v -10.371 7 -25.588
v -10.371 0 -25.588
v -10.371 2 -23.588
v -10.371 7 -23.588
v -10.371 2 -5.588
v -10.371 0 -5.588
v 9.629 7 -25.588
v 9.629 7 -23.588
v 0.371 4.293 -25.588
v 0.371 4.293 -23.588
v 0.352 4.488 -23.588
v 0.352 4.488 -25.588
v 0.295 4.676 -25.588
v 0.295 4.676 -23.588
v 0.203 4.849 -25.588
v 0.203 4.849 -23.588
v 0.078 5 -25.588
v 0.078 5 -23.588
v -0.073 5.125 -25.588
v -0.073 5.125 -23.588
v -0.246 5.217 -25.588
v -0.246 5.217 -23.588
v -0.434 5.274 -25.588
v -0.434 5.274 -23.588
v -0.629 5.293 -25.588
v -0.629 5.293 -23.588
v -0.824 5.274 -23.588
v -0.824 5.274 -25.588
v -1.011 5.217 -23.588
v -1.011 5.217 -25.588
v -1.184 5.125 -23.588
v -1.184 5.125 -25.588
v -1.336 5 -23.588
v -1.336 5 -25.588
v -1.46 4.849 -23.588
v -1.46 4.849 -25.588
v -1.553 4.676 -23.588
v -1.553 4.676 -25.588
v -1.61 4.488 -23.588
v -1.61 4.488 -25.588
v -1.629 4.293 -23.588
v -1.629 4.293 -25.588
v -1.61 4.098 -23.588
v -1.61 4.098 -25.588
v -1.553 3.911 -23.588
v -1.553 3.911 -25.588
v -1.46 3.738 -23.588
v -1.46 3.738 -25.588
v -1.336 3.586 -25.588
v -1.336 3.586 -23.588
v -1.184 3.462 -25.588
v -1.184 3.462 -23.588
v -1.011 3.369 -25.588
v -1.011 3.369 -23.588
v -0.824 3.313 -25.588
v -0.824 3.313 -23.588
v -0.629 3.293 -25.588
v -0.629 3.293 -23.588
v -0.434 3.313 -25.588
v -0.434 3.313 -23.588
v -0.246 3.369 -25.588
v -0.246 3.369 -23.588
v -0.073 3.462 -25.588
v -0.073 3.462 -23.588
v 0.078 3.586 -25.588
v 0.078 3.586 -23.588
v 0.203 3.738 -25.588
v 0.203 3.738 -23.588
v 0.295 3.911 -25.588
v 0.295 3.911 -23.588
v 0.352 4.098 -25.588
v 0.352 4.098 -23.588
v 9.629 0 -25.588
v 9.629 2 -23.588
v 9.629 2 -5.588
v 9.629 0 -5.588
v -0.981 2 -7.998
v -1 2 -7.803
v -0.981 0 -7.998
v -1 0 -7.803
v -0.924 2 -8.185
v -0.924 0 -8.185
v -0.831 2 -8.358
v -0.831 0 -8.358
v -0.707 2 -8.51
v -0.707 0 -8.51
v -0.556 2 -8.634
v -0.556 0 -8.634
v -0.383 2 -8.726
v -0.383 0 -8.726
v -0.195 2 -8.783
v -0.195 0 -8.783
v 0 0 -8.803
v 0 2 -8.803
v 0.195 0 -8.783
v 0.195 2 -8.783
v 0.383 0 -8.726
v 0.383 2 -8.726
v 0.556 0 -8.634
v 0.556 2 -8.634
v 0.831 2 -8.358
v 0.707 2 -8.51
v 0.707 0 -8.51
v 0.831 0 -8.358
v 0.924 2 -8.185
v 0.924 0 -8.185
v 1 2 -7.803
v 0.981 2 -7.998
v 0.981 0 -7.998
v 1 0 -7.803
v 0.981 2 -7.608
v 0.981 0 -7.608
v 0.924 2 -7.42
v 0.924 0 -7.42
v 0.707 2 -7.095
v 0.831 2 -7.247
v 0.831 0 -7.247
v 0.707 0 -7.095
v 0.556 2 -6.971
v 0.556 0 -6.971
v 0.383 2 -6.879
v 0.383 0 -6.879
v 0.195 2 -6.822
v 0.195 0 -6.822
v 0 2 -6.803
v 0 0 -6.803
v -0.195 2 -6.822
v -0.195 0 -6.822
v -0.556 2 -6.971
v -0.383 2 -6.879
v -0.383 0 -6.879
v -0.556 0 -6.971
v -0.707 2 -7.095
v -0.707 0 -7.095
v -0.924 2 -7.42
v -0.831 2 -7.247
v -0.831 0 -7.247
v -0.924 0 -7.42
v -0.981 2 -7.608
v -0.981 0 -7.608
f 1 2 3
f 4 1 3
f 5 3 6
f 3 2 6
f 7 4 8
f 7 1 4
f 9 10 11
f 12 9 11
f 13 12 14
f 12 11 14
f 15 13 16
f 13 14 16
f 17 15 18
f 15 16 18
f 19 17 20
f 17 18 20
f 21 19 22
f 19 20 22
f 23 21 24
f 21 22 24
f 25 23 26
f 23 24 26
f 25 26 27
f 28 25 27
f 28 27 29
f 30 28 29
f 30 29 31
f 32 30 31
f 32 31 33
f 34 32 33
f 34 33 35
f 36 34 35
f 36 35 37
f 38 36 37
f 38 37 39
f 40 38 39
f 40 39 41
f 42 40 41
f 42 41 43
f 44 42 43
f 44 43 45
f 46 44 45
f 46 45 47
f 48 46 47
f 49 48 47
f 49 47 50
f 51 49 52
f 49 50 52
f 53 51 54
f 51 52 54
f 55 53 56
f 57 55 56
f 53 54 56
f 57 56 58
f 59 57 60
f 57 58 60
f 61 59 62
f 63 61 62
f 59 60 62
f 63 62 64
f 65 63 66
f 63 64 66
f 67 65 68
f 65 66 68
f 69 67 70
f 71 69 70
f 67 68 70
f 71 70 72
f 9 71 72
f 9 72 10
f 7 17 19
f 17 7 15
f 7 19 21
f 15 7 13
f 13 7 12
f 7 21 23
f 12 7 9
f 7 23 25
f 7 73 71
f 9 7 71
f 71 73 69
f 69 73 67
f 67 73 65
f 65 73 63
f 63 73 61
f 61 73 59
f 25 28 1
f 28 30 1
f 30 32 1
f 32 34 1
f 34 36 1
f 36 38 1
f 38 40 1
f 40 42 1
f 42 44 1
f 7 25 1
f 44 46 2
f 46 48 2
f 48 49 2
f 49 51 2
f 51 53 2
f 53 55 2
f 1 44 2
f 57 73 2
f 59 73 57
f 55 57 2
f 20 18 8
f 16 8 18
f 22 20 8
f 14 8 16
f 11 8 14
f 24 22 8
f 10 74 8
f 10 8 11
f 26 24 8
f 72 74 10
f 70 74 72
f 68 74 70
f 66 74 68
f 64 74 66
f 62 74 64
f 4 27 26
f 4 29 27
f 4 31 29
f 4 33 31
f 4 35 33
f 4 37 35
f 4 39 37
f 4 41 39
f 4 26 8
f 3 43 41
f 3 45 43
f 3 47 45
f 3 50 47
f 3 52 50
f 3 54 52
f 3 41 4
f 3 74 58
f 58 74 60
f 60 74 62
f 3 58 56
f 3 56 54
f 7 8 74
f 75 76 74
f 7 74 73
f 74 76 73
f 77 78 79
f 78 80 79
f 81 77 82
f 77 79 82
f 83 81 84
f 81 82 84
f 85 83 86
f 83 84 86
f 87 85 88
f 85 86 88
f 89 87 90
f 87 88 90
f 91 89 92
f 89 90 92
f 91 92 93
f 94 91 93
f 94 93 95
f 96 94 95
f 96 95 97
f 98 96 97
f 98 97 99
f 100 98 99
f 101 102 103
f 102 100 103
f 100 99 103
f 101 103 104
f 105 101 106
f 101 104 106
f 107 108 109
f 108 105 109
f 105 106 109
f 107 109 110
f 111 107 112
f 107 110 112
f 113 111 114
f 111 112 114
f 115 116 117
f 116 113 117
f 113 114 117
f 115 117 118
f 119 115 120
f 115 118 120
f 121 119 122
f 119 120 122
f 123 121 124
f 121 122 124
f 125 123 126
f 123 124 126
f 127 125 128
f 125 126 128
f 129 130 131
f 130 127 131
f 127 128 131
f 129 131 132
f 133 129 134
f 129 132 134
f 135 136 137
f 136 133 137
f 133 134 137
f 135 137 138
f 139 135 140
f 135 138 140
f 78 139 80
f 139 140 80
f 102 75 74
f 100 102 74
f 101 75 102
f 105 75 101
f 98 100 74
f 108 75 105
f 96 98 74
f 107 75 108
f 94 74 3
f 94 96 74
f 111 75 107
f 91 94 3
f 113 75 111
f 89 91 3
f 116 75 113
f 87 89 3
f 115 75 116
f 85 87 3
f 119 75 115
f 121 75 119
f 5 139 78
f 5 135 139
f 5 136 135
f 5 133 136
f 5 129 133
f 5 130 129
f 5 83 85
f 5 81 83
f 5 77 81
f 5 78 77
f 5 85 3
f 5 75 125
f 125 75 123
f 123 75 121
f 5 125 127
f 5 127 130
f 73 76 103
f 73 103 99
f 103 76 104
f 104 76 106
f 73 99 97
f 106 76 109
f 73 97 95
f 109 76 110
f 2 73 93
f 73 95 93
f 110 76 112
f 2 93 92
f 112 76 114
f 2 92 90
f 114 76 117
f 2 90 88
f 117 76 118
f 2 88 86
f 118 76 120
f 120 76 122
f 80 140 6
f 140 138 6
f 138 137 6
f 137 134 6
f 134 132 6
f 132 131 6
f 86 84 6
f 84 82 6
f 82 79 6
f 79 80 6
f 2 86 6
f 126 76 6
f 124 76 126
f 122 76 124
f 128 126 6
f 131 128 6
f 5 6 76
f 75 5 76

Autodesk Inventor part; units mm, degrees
ref_plane "YZ Plane" through (0, 0, 0) normal (1, 0, 0) x (0, 1, 0)
ref_plane "XZ Plane" through (0, 0, 0) normal (0, 1, 0) x (-1, 0, 0)
ref_plane "XY Plane" through (0, 0, 0) normal (0, 0, 1) x (1, 0, 0)
sketch "Sketch1" plane through (0, 0, 0) normal (0, 1, 0) x (-1, 0, 0)
  line L0 (10.371, -5.5878) -> (-9.629, -5.5878)
  line L1 (-9.629, -5.5878) -> (-9.629, -25.5878)
  line L2 (-9.629, -25.5878) -> (10.371, -25.5878)
  line L3 (10.371, -25.5878) -> (10.371, -5.5878)
  circle A0 centre (0, -7.8026) radius 1
  point P0 (0, 0)
  dimension "d0" = 20
  dimension "d1" = 20
  dimension "d2" = 2
extrude "Extrusion1" add sketch "Sketch1" along normal blind 2
sketch "Sketch2" plane through (0, 2, 0) normal (0, 1, 0) x (1, 0, 0)
  line L0 (9.629, 25.5878) -> (-10.371, 25.5878) projected
  line L1 (-10.371, 25.5878) -> (9.629, 25.5878)
  line L2 (9.629, 25.5878) -> (9.629, 23.5878)
  line L3 (9.629, 23.5878) -> (-10.371, 23.5878)
  line L4 (-10.371, 23.5878) -> (-10.371, 25.5878)
  point P0 (0, 0)
  dimension "d5" = 20
  dimension "d6" = 2
extrude "Extrusion2" add sketch "Sketch2" along normal blind 5
sketch "Sketch3" plane through (-10.371, 2, -23.5878) normal (0, 0, 1) x (1, 0, 0)
  circle A0 centre (9.7422, 2.2933) radius 1
  point P0 (10.371, -2)
  dimension "d9" = 2
extrude "Extrusion3" cut sketch "Sketch3" against normal blind 5
properties part number "clampforplatform"
